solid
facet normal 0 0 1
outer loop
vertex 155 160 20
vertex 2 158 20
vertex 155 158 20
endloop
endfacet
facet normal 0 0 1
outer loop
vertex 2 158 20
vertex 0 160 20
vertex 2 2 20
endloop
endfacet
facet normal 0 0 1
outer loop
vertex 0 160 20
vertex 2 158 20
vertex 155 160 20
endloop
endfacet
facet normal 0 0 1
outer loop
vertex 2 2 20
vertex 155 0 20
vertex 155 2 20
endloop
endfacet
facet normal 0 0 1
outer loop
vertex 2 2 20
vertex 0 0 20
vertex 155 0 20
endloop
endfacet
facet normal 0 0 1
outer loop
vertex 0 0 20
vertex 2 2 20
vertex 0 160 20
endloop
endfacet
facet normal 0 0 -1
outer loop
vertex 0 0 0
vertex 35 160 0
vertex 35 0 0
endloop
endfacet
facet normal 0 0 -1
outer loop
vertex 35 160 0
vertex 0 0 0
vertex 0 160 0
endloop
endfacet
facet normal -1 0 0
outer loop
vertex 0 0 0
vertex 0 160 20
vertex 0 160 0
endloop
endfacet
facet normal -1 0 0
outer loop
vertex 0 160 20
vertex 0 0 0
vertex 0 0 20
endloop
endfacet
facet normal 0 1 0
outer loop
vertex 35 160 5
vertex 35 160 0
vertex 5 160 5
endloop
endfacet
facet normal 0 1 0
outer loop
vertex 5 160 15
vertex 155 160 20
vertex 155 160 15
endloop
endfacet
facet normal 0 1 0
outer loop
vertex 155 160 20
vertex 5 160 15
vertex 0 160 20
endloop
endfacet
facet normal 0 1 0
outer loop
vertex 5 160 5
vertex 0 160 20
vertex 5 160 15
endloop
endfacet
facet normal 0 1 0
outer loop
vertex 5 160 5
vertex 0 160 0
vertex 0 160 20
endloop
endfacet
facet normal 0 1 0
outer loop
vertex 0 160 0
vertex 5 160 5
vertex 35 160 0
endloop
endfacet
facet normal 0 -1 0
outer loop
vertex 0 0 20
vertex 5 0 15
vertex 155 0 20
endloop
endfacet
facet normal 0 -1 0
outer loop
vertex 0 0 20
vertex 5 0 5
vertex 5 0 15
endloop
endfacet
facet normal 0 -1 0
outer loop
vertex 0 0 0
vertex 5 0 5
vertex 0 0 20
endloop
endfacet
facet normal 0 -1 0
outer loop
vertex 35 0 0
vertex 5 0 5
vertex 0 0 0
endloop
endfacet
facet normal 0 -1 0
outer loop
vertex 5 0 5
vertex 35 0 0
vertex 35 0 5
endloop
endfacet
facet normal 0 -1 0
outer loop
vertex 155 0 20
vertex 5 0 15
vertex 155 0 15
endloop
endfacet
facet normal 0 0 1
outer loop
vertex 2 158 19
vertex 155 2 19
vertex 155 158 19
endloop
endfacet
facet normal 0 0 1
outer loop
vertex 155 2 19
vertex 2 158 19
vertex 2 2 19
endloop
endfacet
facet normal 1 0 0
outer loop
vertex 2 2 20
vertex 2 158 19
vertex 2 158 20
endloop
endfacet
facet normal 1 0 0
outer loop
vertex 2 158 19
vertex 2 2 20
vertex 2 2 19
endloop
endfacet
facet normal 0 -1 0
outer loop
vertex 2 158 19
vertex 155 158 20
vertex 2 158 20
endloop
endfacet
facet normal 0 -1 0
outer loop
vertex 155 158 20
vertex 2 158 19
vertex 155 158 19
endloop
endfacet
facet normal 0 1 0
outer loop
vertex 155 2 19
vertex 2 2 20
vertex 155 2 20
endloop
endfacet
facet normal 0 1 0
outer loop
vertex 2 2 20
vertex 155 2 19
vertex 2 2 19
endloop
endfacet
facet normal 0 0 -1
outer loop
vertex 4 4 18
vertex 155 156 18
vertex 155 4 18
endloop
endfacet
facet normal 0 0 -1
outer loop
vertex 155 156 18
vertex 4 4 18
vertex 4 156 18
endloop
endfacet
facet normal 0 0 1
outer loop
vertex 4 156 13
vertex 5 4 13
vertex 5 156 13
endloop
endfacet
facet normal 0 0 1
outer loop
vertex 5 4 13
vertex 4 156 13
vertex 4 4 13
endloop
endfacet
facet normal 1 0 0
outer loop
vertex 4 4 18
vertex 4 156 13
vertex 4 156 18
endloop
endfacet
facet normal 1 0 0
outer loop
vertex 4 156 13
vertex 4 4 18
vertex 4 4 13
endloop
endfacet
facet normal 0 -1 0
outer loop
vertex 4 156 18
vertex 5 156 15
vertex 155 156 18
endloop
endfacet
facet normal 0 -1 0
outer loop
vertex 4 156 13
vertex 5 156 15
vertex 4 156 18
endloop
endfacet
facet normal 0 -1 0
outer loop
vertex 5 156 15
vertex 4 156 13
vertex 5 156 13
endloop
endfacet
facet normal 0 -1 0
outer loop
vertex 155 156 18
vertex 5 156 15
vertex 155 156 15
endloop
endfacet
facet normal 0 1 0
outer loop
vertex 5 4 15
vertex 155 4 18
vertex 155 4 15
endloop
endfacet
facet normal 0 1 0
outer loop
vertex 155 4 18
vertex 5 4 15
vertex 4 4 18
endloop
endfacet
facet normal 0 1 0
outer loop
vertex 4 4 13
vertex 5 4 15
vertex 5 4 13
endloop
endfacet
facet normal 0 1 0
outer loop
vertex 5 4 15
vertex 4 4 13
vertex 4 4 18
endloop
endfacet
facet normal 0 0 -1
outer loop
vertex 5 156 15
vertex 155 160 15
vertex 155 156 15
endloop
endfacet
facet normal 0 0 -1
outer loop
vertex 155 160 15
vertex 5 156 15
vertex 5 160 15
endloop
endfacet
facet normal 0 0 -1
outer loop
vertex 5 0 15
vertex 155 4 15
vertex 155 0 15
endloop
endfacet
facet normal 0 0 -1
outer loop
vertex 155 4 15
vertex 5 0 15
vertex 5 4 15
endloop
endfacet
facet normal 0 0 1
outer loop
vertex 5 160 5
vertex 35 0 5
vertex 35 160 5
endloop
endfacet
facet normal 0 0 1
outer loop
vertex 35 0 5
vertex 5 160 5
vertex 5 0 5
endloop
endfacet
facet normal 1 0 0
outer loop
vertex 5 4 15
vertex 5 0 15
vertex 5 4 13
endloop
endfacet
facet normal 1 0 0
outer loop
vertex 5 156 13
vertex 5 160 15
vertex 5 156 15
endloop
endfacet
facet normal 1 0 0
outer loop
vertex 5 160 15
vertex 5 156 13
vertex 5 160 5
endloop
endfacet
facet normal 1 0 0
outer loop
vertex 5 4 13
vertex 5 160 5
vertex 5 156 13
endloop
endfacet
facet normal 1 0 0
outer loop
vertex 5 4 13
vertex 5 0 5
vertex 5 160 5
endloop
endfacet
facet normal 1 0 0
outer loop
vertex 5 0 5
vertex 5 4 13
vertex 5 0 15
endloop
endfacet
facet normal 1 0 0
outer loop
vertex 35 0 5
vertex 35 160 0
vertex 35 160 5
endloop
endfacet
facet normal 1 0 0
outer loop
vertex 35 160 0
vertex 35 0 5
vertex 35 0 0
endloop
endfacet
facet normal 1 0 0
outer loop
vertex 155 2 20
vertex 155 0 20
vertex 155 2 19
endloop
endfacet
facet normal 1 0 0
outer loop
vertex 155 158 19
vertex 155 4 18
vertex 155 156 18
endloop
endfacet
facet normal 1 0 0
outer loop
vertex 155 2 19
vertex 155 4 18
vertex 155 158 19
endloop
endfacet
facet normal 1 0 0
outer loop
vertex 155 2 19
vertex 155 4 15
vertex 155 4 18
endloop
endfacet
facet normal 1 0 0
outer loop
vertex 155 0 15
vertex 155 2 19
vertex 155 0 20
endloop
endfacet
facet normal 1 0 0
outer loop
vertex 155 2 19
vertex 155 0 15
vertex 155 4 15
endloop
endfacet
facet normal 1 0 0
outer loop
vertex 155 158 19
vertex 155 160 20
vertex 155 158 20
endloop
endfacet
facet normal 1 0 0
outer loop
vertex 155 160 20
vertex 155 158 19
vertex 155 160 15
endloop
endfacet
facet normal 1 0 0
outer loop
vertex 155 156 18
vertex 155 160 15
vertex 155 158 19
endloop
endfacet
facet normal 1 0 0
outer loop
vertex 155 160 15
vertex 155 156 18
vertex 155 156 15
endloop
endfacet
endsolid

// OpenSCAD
pc_depth = 10;
pc_width = 300;
pc_height = 150;

wall = 5;
lip = 30;

module full() {
    difference() {
        cube([pc_width+wall*2, pc_height+wall*2, pc_depth+wall*2]);
        
        
        translate([2, 2, wall*2+pc_depth-1])
        cube([pc_width+wall*2-4, pc_height+wall*2-4, 20]);
        
        translate([4, 4, wall+pc_depth-2])
        cube([pc_width+wall*2-8, pc_height+wall*2-8, 5]);
        
        translate([wall, -wall/2, wall])
        cube([pc_width, pc_height+(wall*3), pc_depth]);

       
        translate([wall+lip, -wall/2, -0.01])
        cube([pc_width-lip*2, pc_height+(wall*3), wall+0.2]);

    }
}

// left
difference() {
    full();
    
    translate([pc_width/2+wall,-50,-50])
    cube([pc_width/2+wall+50, pc_height+wall*2+100, 100]);
}

/*
// right
difference() {
    full();
    
    translate([-50,-50,-50])
    cube([pc_width/2+wall+50, pc_height+wall*2+100, 100]);
}
*/
